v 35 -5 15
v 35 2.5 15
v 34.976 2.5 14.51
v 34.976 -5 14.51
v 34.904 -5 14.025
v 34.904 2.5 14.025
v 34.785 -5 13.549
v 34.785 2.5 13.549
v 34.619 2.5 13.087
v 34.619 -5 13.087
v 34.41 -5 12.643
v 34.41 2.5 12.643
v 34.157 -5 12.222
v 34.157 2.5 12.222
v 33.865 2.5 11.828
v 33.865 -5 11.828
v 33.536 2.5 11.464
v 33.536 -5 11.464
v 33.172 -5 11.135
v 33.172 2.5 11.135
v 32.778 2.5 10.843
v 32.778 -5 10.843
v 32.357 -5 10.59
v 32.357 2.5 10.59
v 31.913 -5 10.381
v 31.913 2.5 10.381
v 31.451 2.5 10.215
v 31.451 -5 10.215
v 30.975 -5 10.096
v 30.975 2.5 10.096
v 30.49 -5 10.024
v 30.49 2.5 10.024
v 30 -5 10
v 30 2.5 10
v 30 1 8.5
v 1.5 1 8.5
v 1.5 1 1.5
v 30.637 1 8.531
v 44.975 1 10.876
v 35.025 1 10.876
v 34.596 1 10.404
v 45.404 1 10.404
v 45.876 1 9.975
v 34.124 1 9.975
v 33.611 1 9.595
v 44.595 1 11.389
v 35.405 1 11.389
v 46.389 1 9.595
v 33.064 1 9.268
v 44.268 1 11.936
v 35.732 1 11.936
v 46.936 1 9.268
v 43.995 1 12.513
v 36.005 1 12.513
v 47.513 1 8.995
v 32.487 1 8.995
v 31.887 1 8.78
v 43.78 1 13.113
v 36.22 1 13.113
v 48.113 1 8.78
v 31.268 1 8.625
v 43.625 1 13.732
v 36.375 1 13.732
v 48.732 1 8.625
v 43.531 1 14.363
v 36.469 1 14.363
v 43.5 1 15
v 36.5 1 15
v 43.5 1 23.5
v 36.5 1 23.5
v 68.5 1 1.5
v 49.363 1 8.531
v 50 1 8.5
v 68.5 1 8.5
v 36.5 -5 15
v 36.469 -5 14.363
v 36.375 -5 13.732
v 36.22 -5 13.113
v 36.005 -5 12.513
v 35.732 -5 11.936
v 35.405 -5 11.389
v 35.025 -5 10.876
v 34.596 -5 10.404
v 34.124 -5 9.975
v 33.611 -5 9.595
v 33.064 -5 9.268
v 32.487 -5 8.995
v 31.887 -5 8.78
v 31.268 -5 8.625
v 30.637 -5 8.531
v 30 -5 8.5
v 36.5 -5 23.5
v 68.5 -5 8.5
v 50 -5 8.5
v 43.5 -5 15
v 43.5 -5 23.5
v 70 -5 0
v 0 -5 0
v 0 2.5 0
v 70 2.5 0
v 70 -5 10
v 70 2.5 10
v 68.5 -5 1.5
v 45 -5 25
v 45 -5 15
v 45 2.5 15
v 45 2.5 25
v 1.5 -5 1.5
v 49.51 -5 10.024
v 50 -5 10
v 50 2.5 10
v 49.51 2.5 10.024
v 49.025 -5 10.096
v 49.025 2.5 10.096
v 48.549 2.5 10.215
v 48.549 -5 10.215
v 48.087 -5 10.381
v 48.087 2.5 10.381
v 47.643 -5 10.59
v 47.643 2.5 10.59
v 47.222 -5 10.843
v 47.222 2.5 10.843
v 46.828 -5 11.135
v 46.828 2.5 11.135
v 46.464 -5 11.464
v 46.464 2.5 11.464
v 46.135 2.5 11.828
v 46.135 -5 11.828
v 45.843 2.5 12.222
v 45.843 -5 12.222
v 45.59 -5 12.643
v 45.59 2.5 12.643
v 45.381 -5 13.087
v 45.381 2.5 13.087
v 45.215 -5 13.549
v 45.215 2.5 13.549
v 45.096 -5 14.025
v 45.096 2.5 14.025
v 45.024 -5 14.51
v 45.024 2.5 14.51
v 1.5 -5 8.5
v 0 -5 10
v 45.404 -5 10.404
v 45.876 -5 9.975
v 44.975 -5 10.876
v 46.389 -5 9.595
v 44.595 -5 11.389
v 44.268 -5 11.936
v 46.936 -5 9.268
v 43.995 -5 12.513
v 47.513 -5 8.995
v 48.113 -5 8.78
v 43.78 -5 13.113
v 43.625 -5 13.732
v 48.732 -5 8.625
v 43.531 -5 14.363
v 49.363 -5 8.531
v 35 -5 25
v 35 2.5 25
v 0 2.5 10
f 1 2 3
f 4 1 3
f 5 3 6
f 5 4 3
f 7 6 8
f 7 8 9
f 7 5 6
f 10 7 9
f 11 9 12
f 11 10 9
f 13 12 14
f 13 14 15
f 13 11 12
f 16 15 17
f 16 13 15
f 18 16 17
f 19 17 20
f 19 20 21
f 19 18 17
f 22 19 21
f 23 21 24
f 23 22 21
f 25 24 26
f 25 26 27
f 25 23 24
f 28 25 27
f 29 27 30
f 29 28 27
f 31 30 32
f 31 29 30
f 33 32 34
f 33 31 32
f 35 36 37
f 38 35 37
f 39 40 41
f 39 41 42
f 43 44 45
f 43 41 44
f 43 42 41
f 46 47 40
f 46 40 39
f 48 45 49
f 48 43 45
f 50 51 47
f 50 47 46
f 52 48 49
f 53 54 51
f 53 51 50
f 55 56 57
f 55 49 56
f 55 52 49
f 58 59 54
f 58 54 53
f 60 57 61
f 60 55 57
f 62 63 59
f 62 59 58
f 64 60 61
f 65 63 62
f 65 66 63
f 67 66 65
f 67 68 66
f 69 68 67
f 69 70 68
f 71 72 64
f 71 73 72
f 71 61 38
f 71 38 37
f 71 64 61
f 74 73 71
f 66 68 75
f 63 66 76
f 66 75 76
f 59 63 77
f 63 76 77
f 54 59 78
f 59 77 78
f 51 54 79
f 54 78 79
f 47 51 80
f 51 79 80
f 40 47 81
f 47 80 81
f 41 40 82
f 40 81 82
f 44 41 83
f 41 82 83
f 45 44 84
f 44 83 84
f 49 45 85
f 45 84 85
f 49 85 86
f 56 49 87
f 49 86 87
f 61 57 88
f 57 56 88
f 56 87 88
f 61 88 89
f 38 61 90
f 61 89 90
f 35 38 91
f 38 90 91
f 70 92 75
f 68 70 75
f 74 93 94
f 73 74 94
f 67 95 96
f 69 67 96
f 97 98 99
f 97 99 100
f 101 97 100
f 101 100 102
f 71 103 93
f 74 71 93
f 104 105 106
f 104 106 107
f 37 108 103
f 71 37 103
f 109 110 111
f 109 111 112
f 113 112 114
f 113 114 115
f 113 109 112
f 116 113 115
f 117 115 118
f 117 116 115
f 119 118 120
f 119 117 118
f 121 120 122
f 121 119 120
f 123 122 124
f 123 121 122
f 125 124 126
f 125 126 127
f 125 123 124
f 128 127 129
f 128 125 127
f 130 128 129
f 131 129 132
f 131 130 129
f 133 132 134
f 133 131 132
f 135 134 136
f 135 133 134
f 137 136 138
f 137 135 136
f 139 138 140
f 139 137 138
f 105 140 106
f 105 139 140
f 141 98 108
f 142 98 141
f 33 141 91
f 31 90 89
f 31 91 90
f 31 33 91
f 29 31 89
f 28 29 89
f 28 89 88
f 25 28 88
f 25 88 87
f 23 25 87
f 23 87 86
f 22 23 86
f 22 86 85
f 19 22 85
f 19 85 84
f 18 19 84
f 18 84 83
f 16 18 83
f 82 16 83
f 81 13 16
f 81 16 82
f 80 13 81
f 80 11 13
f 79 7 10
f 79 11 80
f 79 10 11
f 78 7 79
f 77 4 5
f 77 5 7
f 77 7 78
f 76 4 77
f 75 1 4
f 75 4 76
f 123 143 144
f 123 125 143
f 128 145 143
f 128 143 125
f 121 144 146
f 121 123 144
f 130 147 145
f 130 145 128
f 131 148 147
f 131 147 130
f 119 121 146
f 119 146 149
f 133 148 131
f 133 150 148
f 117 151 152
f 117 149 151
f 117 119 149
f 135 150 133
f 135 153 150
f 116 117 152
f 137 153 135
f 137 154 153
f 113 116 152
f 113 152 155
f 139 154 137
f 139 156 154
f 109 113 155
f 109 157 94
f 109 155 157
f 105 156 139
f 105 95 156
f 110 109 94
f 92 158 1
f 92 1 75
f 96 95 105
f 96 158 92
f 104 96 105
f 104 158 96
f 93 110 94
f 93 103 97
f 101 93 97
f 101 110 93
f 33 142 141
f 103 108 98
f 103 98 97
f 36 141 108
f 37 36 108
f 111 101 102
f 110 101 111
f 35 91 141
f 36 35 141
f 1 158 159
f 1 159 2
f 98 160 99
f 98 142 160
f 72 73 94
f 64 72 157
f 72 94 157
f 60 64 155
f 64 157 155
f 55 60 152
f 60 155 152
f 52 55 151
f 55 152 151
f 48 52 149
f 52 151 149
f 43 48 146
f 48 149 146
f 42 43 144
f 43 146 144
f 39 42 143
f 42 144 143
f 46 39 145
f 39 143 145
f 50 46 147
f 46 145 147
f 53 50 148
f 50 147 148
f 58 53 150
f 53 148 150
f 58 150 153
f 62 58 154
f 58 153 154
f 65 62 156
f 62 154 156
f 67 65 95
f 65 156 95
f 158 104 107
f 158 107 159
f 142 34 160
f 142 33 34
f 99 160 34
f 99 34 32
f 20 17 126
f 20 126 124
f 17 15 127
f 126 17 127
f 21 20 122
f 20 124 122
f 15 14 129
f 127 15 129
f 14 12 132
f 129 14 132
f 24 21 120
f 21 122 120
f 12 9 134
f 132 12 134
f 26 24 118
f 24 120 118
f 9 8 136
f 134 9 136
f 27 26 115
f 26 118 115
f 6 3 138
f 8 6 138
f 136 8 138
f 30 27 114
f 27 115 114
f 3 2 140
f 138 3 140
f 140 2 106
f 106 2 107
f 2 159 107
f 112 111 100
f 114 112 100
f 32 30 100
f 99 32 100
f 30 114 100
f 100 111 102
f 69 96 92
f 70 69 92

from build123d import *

# Parameters (mm, degrees)
F2_DEPTH = 5
F3_DEPTH = 2.5
F4_T     = -1.5


with BuildPart() as f2:
    # F0 (on Front) → F2 (new body)
    with BuildSketch(Plane.XZ):
        with BuildLine():
            Line((0, 10), (0, 0))
            Line((0, 0), (70, 0))
            Line((70, 0), (70, 10))
            Line((70, 10), (50, 10))
            ThreePointArc((50, 10), (46.464466, 11.464466), (45, 15))
            Line((45, 15), (45, 25))
            Line((45, 25), (35, 25))
            Line((35, 25), (35, 15))
            ThreePointArc((35, 15), (33.535534, 11.464466), (30, 10))
            Line((30, 10), (0, 10))
        make_face()
    extrude(amount=F2_DEPTH)

    # F0 (on Front) → F3 (join, symmetric)
    with BuildSketch(Plane.XZ):
        with BuildLine():
            Line((0, 10), (0, 0))
            Line((0, 0), (70, 0))
            Line((70, 0), (70, 10))
            Line((70, 10), (50, 10))
            ThreePointArc((50, 10), (46.464466, 11.464466), (45, 15))
            Line((45, 15), (45, 25))
            Line((45, 25), (35, 25))
            Line((35, 25), (35, 15))
            ThreePointArc((35, 15), (33.535534, 11.464466), (30, 10))
            Line((30, 10), (0, 10))
        make_face()
    extrude(amount=F3_DEPTH, both=True)

    # F4
    f4_openings = [f2.faces().sort_by_distance(p)[0] for p in [
        (35.933685, -5, 7.254637),
    ]]
    offset(amount=F4_T, openings=f4_openings)


solid = f2.part
